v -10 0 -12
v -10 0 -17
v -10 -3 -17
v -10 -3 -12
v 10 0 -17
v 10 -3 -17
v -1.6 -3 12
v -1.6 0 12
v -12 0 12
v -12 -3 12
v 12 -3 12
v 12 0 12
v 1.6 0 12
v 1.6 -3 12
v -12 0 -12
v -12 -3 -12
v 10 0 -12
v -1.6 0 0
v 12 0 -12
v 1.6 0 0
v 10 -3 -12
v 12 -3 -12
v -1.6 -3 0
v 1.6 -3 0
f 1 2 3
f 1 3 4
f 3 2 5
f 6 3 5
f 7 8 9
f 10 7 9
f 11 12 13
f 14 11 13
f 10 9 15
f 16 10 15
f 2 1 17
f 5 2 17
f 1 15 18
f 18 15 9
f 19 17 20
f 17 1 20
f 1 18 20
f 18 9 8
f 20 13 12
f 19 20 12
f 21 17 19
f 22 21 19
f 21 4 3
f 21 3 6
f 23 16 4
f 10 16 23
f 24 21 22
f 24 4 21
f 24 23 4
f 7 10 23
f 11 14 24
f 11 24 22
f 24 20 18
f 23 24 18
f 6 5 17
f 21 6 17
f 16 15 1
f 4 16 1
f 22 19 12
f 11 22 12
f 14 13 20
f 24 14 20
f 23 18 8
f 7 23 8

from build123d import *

# Parameters (mm, degrees)
F0_W     = 20
F0_H     = 5
F1_DEPTH = 3


with BuildPart() as f1:
    # F0 (on Front) → F1 (new body)
    with BuildSketch(Plane.XZ):
        Polygon((-12, 12), (-12, -12), (-10, -12), (10, -12), (12, -12), (12, 12), (1.6, 12), (1.6, 0), (-1.6, 0), (-1.6, 12), align=None)
        with Locations((0, -14.5)):
            Rectangle(F0_W, F0_H)
    extrude(amount=F1_DEPTH)


solid = f1.part
